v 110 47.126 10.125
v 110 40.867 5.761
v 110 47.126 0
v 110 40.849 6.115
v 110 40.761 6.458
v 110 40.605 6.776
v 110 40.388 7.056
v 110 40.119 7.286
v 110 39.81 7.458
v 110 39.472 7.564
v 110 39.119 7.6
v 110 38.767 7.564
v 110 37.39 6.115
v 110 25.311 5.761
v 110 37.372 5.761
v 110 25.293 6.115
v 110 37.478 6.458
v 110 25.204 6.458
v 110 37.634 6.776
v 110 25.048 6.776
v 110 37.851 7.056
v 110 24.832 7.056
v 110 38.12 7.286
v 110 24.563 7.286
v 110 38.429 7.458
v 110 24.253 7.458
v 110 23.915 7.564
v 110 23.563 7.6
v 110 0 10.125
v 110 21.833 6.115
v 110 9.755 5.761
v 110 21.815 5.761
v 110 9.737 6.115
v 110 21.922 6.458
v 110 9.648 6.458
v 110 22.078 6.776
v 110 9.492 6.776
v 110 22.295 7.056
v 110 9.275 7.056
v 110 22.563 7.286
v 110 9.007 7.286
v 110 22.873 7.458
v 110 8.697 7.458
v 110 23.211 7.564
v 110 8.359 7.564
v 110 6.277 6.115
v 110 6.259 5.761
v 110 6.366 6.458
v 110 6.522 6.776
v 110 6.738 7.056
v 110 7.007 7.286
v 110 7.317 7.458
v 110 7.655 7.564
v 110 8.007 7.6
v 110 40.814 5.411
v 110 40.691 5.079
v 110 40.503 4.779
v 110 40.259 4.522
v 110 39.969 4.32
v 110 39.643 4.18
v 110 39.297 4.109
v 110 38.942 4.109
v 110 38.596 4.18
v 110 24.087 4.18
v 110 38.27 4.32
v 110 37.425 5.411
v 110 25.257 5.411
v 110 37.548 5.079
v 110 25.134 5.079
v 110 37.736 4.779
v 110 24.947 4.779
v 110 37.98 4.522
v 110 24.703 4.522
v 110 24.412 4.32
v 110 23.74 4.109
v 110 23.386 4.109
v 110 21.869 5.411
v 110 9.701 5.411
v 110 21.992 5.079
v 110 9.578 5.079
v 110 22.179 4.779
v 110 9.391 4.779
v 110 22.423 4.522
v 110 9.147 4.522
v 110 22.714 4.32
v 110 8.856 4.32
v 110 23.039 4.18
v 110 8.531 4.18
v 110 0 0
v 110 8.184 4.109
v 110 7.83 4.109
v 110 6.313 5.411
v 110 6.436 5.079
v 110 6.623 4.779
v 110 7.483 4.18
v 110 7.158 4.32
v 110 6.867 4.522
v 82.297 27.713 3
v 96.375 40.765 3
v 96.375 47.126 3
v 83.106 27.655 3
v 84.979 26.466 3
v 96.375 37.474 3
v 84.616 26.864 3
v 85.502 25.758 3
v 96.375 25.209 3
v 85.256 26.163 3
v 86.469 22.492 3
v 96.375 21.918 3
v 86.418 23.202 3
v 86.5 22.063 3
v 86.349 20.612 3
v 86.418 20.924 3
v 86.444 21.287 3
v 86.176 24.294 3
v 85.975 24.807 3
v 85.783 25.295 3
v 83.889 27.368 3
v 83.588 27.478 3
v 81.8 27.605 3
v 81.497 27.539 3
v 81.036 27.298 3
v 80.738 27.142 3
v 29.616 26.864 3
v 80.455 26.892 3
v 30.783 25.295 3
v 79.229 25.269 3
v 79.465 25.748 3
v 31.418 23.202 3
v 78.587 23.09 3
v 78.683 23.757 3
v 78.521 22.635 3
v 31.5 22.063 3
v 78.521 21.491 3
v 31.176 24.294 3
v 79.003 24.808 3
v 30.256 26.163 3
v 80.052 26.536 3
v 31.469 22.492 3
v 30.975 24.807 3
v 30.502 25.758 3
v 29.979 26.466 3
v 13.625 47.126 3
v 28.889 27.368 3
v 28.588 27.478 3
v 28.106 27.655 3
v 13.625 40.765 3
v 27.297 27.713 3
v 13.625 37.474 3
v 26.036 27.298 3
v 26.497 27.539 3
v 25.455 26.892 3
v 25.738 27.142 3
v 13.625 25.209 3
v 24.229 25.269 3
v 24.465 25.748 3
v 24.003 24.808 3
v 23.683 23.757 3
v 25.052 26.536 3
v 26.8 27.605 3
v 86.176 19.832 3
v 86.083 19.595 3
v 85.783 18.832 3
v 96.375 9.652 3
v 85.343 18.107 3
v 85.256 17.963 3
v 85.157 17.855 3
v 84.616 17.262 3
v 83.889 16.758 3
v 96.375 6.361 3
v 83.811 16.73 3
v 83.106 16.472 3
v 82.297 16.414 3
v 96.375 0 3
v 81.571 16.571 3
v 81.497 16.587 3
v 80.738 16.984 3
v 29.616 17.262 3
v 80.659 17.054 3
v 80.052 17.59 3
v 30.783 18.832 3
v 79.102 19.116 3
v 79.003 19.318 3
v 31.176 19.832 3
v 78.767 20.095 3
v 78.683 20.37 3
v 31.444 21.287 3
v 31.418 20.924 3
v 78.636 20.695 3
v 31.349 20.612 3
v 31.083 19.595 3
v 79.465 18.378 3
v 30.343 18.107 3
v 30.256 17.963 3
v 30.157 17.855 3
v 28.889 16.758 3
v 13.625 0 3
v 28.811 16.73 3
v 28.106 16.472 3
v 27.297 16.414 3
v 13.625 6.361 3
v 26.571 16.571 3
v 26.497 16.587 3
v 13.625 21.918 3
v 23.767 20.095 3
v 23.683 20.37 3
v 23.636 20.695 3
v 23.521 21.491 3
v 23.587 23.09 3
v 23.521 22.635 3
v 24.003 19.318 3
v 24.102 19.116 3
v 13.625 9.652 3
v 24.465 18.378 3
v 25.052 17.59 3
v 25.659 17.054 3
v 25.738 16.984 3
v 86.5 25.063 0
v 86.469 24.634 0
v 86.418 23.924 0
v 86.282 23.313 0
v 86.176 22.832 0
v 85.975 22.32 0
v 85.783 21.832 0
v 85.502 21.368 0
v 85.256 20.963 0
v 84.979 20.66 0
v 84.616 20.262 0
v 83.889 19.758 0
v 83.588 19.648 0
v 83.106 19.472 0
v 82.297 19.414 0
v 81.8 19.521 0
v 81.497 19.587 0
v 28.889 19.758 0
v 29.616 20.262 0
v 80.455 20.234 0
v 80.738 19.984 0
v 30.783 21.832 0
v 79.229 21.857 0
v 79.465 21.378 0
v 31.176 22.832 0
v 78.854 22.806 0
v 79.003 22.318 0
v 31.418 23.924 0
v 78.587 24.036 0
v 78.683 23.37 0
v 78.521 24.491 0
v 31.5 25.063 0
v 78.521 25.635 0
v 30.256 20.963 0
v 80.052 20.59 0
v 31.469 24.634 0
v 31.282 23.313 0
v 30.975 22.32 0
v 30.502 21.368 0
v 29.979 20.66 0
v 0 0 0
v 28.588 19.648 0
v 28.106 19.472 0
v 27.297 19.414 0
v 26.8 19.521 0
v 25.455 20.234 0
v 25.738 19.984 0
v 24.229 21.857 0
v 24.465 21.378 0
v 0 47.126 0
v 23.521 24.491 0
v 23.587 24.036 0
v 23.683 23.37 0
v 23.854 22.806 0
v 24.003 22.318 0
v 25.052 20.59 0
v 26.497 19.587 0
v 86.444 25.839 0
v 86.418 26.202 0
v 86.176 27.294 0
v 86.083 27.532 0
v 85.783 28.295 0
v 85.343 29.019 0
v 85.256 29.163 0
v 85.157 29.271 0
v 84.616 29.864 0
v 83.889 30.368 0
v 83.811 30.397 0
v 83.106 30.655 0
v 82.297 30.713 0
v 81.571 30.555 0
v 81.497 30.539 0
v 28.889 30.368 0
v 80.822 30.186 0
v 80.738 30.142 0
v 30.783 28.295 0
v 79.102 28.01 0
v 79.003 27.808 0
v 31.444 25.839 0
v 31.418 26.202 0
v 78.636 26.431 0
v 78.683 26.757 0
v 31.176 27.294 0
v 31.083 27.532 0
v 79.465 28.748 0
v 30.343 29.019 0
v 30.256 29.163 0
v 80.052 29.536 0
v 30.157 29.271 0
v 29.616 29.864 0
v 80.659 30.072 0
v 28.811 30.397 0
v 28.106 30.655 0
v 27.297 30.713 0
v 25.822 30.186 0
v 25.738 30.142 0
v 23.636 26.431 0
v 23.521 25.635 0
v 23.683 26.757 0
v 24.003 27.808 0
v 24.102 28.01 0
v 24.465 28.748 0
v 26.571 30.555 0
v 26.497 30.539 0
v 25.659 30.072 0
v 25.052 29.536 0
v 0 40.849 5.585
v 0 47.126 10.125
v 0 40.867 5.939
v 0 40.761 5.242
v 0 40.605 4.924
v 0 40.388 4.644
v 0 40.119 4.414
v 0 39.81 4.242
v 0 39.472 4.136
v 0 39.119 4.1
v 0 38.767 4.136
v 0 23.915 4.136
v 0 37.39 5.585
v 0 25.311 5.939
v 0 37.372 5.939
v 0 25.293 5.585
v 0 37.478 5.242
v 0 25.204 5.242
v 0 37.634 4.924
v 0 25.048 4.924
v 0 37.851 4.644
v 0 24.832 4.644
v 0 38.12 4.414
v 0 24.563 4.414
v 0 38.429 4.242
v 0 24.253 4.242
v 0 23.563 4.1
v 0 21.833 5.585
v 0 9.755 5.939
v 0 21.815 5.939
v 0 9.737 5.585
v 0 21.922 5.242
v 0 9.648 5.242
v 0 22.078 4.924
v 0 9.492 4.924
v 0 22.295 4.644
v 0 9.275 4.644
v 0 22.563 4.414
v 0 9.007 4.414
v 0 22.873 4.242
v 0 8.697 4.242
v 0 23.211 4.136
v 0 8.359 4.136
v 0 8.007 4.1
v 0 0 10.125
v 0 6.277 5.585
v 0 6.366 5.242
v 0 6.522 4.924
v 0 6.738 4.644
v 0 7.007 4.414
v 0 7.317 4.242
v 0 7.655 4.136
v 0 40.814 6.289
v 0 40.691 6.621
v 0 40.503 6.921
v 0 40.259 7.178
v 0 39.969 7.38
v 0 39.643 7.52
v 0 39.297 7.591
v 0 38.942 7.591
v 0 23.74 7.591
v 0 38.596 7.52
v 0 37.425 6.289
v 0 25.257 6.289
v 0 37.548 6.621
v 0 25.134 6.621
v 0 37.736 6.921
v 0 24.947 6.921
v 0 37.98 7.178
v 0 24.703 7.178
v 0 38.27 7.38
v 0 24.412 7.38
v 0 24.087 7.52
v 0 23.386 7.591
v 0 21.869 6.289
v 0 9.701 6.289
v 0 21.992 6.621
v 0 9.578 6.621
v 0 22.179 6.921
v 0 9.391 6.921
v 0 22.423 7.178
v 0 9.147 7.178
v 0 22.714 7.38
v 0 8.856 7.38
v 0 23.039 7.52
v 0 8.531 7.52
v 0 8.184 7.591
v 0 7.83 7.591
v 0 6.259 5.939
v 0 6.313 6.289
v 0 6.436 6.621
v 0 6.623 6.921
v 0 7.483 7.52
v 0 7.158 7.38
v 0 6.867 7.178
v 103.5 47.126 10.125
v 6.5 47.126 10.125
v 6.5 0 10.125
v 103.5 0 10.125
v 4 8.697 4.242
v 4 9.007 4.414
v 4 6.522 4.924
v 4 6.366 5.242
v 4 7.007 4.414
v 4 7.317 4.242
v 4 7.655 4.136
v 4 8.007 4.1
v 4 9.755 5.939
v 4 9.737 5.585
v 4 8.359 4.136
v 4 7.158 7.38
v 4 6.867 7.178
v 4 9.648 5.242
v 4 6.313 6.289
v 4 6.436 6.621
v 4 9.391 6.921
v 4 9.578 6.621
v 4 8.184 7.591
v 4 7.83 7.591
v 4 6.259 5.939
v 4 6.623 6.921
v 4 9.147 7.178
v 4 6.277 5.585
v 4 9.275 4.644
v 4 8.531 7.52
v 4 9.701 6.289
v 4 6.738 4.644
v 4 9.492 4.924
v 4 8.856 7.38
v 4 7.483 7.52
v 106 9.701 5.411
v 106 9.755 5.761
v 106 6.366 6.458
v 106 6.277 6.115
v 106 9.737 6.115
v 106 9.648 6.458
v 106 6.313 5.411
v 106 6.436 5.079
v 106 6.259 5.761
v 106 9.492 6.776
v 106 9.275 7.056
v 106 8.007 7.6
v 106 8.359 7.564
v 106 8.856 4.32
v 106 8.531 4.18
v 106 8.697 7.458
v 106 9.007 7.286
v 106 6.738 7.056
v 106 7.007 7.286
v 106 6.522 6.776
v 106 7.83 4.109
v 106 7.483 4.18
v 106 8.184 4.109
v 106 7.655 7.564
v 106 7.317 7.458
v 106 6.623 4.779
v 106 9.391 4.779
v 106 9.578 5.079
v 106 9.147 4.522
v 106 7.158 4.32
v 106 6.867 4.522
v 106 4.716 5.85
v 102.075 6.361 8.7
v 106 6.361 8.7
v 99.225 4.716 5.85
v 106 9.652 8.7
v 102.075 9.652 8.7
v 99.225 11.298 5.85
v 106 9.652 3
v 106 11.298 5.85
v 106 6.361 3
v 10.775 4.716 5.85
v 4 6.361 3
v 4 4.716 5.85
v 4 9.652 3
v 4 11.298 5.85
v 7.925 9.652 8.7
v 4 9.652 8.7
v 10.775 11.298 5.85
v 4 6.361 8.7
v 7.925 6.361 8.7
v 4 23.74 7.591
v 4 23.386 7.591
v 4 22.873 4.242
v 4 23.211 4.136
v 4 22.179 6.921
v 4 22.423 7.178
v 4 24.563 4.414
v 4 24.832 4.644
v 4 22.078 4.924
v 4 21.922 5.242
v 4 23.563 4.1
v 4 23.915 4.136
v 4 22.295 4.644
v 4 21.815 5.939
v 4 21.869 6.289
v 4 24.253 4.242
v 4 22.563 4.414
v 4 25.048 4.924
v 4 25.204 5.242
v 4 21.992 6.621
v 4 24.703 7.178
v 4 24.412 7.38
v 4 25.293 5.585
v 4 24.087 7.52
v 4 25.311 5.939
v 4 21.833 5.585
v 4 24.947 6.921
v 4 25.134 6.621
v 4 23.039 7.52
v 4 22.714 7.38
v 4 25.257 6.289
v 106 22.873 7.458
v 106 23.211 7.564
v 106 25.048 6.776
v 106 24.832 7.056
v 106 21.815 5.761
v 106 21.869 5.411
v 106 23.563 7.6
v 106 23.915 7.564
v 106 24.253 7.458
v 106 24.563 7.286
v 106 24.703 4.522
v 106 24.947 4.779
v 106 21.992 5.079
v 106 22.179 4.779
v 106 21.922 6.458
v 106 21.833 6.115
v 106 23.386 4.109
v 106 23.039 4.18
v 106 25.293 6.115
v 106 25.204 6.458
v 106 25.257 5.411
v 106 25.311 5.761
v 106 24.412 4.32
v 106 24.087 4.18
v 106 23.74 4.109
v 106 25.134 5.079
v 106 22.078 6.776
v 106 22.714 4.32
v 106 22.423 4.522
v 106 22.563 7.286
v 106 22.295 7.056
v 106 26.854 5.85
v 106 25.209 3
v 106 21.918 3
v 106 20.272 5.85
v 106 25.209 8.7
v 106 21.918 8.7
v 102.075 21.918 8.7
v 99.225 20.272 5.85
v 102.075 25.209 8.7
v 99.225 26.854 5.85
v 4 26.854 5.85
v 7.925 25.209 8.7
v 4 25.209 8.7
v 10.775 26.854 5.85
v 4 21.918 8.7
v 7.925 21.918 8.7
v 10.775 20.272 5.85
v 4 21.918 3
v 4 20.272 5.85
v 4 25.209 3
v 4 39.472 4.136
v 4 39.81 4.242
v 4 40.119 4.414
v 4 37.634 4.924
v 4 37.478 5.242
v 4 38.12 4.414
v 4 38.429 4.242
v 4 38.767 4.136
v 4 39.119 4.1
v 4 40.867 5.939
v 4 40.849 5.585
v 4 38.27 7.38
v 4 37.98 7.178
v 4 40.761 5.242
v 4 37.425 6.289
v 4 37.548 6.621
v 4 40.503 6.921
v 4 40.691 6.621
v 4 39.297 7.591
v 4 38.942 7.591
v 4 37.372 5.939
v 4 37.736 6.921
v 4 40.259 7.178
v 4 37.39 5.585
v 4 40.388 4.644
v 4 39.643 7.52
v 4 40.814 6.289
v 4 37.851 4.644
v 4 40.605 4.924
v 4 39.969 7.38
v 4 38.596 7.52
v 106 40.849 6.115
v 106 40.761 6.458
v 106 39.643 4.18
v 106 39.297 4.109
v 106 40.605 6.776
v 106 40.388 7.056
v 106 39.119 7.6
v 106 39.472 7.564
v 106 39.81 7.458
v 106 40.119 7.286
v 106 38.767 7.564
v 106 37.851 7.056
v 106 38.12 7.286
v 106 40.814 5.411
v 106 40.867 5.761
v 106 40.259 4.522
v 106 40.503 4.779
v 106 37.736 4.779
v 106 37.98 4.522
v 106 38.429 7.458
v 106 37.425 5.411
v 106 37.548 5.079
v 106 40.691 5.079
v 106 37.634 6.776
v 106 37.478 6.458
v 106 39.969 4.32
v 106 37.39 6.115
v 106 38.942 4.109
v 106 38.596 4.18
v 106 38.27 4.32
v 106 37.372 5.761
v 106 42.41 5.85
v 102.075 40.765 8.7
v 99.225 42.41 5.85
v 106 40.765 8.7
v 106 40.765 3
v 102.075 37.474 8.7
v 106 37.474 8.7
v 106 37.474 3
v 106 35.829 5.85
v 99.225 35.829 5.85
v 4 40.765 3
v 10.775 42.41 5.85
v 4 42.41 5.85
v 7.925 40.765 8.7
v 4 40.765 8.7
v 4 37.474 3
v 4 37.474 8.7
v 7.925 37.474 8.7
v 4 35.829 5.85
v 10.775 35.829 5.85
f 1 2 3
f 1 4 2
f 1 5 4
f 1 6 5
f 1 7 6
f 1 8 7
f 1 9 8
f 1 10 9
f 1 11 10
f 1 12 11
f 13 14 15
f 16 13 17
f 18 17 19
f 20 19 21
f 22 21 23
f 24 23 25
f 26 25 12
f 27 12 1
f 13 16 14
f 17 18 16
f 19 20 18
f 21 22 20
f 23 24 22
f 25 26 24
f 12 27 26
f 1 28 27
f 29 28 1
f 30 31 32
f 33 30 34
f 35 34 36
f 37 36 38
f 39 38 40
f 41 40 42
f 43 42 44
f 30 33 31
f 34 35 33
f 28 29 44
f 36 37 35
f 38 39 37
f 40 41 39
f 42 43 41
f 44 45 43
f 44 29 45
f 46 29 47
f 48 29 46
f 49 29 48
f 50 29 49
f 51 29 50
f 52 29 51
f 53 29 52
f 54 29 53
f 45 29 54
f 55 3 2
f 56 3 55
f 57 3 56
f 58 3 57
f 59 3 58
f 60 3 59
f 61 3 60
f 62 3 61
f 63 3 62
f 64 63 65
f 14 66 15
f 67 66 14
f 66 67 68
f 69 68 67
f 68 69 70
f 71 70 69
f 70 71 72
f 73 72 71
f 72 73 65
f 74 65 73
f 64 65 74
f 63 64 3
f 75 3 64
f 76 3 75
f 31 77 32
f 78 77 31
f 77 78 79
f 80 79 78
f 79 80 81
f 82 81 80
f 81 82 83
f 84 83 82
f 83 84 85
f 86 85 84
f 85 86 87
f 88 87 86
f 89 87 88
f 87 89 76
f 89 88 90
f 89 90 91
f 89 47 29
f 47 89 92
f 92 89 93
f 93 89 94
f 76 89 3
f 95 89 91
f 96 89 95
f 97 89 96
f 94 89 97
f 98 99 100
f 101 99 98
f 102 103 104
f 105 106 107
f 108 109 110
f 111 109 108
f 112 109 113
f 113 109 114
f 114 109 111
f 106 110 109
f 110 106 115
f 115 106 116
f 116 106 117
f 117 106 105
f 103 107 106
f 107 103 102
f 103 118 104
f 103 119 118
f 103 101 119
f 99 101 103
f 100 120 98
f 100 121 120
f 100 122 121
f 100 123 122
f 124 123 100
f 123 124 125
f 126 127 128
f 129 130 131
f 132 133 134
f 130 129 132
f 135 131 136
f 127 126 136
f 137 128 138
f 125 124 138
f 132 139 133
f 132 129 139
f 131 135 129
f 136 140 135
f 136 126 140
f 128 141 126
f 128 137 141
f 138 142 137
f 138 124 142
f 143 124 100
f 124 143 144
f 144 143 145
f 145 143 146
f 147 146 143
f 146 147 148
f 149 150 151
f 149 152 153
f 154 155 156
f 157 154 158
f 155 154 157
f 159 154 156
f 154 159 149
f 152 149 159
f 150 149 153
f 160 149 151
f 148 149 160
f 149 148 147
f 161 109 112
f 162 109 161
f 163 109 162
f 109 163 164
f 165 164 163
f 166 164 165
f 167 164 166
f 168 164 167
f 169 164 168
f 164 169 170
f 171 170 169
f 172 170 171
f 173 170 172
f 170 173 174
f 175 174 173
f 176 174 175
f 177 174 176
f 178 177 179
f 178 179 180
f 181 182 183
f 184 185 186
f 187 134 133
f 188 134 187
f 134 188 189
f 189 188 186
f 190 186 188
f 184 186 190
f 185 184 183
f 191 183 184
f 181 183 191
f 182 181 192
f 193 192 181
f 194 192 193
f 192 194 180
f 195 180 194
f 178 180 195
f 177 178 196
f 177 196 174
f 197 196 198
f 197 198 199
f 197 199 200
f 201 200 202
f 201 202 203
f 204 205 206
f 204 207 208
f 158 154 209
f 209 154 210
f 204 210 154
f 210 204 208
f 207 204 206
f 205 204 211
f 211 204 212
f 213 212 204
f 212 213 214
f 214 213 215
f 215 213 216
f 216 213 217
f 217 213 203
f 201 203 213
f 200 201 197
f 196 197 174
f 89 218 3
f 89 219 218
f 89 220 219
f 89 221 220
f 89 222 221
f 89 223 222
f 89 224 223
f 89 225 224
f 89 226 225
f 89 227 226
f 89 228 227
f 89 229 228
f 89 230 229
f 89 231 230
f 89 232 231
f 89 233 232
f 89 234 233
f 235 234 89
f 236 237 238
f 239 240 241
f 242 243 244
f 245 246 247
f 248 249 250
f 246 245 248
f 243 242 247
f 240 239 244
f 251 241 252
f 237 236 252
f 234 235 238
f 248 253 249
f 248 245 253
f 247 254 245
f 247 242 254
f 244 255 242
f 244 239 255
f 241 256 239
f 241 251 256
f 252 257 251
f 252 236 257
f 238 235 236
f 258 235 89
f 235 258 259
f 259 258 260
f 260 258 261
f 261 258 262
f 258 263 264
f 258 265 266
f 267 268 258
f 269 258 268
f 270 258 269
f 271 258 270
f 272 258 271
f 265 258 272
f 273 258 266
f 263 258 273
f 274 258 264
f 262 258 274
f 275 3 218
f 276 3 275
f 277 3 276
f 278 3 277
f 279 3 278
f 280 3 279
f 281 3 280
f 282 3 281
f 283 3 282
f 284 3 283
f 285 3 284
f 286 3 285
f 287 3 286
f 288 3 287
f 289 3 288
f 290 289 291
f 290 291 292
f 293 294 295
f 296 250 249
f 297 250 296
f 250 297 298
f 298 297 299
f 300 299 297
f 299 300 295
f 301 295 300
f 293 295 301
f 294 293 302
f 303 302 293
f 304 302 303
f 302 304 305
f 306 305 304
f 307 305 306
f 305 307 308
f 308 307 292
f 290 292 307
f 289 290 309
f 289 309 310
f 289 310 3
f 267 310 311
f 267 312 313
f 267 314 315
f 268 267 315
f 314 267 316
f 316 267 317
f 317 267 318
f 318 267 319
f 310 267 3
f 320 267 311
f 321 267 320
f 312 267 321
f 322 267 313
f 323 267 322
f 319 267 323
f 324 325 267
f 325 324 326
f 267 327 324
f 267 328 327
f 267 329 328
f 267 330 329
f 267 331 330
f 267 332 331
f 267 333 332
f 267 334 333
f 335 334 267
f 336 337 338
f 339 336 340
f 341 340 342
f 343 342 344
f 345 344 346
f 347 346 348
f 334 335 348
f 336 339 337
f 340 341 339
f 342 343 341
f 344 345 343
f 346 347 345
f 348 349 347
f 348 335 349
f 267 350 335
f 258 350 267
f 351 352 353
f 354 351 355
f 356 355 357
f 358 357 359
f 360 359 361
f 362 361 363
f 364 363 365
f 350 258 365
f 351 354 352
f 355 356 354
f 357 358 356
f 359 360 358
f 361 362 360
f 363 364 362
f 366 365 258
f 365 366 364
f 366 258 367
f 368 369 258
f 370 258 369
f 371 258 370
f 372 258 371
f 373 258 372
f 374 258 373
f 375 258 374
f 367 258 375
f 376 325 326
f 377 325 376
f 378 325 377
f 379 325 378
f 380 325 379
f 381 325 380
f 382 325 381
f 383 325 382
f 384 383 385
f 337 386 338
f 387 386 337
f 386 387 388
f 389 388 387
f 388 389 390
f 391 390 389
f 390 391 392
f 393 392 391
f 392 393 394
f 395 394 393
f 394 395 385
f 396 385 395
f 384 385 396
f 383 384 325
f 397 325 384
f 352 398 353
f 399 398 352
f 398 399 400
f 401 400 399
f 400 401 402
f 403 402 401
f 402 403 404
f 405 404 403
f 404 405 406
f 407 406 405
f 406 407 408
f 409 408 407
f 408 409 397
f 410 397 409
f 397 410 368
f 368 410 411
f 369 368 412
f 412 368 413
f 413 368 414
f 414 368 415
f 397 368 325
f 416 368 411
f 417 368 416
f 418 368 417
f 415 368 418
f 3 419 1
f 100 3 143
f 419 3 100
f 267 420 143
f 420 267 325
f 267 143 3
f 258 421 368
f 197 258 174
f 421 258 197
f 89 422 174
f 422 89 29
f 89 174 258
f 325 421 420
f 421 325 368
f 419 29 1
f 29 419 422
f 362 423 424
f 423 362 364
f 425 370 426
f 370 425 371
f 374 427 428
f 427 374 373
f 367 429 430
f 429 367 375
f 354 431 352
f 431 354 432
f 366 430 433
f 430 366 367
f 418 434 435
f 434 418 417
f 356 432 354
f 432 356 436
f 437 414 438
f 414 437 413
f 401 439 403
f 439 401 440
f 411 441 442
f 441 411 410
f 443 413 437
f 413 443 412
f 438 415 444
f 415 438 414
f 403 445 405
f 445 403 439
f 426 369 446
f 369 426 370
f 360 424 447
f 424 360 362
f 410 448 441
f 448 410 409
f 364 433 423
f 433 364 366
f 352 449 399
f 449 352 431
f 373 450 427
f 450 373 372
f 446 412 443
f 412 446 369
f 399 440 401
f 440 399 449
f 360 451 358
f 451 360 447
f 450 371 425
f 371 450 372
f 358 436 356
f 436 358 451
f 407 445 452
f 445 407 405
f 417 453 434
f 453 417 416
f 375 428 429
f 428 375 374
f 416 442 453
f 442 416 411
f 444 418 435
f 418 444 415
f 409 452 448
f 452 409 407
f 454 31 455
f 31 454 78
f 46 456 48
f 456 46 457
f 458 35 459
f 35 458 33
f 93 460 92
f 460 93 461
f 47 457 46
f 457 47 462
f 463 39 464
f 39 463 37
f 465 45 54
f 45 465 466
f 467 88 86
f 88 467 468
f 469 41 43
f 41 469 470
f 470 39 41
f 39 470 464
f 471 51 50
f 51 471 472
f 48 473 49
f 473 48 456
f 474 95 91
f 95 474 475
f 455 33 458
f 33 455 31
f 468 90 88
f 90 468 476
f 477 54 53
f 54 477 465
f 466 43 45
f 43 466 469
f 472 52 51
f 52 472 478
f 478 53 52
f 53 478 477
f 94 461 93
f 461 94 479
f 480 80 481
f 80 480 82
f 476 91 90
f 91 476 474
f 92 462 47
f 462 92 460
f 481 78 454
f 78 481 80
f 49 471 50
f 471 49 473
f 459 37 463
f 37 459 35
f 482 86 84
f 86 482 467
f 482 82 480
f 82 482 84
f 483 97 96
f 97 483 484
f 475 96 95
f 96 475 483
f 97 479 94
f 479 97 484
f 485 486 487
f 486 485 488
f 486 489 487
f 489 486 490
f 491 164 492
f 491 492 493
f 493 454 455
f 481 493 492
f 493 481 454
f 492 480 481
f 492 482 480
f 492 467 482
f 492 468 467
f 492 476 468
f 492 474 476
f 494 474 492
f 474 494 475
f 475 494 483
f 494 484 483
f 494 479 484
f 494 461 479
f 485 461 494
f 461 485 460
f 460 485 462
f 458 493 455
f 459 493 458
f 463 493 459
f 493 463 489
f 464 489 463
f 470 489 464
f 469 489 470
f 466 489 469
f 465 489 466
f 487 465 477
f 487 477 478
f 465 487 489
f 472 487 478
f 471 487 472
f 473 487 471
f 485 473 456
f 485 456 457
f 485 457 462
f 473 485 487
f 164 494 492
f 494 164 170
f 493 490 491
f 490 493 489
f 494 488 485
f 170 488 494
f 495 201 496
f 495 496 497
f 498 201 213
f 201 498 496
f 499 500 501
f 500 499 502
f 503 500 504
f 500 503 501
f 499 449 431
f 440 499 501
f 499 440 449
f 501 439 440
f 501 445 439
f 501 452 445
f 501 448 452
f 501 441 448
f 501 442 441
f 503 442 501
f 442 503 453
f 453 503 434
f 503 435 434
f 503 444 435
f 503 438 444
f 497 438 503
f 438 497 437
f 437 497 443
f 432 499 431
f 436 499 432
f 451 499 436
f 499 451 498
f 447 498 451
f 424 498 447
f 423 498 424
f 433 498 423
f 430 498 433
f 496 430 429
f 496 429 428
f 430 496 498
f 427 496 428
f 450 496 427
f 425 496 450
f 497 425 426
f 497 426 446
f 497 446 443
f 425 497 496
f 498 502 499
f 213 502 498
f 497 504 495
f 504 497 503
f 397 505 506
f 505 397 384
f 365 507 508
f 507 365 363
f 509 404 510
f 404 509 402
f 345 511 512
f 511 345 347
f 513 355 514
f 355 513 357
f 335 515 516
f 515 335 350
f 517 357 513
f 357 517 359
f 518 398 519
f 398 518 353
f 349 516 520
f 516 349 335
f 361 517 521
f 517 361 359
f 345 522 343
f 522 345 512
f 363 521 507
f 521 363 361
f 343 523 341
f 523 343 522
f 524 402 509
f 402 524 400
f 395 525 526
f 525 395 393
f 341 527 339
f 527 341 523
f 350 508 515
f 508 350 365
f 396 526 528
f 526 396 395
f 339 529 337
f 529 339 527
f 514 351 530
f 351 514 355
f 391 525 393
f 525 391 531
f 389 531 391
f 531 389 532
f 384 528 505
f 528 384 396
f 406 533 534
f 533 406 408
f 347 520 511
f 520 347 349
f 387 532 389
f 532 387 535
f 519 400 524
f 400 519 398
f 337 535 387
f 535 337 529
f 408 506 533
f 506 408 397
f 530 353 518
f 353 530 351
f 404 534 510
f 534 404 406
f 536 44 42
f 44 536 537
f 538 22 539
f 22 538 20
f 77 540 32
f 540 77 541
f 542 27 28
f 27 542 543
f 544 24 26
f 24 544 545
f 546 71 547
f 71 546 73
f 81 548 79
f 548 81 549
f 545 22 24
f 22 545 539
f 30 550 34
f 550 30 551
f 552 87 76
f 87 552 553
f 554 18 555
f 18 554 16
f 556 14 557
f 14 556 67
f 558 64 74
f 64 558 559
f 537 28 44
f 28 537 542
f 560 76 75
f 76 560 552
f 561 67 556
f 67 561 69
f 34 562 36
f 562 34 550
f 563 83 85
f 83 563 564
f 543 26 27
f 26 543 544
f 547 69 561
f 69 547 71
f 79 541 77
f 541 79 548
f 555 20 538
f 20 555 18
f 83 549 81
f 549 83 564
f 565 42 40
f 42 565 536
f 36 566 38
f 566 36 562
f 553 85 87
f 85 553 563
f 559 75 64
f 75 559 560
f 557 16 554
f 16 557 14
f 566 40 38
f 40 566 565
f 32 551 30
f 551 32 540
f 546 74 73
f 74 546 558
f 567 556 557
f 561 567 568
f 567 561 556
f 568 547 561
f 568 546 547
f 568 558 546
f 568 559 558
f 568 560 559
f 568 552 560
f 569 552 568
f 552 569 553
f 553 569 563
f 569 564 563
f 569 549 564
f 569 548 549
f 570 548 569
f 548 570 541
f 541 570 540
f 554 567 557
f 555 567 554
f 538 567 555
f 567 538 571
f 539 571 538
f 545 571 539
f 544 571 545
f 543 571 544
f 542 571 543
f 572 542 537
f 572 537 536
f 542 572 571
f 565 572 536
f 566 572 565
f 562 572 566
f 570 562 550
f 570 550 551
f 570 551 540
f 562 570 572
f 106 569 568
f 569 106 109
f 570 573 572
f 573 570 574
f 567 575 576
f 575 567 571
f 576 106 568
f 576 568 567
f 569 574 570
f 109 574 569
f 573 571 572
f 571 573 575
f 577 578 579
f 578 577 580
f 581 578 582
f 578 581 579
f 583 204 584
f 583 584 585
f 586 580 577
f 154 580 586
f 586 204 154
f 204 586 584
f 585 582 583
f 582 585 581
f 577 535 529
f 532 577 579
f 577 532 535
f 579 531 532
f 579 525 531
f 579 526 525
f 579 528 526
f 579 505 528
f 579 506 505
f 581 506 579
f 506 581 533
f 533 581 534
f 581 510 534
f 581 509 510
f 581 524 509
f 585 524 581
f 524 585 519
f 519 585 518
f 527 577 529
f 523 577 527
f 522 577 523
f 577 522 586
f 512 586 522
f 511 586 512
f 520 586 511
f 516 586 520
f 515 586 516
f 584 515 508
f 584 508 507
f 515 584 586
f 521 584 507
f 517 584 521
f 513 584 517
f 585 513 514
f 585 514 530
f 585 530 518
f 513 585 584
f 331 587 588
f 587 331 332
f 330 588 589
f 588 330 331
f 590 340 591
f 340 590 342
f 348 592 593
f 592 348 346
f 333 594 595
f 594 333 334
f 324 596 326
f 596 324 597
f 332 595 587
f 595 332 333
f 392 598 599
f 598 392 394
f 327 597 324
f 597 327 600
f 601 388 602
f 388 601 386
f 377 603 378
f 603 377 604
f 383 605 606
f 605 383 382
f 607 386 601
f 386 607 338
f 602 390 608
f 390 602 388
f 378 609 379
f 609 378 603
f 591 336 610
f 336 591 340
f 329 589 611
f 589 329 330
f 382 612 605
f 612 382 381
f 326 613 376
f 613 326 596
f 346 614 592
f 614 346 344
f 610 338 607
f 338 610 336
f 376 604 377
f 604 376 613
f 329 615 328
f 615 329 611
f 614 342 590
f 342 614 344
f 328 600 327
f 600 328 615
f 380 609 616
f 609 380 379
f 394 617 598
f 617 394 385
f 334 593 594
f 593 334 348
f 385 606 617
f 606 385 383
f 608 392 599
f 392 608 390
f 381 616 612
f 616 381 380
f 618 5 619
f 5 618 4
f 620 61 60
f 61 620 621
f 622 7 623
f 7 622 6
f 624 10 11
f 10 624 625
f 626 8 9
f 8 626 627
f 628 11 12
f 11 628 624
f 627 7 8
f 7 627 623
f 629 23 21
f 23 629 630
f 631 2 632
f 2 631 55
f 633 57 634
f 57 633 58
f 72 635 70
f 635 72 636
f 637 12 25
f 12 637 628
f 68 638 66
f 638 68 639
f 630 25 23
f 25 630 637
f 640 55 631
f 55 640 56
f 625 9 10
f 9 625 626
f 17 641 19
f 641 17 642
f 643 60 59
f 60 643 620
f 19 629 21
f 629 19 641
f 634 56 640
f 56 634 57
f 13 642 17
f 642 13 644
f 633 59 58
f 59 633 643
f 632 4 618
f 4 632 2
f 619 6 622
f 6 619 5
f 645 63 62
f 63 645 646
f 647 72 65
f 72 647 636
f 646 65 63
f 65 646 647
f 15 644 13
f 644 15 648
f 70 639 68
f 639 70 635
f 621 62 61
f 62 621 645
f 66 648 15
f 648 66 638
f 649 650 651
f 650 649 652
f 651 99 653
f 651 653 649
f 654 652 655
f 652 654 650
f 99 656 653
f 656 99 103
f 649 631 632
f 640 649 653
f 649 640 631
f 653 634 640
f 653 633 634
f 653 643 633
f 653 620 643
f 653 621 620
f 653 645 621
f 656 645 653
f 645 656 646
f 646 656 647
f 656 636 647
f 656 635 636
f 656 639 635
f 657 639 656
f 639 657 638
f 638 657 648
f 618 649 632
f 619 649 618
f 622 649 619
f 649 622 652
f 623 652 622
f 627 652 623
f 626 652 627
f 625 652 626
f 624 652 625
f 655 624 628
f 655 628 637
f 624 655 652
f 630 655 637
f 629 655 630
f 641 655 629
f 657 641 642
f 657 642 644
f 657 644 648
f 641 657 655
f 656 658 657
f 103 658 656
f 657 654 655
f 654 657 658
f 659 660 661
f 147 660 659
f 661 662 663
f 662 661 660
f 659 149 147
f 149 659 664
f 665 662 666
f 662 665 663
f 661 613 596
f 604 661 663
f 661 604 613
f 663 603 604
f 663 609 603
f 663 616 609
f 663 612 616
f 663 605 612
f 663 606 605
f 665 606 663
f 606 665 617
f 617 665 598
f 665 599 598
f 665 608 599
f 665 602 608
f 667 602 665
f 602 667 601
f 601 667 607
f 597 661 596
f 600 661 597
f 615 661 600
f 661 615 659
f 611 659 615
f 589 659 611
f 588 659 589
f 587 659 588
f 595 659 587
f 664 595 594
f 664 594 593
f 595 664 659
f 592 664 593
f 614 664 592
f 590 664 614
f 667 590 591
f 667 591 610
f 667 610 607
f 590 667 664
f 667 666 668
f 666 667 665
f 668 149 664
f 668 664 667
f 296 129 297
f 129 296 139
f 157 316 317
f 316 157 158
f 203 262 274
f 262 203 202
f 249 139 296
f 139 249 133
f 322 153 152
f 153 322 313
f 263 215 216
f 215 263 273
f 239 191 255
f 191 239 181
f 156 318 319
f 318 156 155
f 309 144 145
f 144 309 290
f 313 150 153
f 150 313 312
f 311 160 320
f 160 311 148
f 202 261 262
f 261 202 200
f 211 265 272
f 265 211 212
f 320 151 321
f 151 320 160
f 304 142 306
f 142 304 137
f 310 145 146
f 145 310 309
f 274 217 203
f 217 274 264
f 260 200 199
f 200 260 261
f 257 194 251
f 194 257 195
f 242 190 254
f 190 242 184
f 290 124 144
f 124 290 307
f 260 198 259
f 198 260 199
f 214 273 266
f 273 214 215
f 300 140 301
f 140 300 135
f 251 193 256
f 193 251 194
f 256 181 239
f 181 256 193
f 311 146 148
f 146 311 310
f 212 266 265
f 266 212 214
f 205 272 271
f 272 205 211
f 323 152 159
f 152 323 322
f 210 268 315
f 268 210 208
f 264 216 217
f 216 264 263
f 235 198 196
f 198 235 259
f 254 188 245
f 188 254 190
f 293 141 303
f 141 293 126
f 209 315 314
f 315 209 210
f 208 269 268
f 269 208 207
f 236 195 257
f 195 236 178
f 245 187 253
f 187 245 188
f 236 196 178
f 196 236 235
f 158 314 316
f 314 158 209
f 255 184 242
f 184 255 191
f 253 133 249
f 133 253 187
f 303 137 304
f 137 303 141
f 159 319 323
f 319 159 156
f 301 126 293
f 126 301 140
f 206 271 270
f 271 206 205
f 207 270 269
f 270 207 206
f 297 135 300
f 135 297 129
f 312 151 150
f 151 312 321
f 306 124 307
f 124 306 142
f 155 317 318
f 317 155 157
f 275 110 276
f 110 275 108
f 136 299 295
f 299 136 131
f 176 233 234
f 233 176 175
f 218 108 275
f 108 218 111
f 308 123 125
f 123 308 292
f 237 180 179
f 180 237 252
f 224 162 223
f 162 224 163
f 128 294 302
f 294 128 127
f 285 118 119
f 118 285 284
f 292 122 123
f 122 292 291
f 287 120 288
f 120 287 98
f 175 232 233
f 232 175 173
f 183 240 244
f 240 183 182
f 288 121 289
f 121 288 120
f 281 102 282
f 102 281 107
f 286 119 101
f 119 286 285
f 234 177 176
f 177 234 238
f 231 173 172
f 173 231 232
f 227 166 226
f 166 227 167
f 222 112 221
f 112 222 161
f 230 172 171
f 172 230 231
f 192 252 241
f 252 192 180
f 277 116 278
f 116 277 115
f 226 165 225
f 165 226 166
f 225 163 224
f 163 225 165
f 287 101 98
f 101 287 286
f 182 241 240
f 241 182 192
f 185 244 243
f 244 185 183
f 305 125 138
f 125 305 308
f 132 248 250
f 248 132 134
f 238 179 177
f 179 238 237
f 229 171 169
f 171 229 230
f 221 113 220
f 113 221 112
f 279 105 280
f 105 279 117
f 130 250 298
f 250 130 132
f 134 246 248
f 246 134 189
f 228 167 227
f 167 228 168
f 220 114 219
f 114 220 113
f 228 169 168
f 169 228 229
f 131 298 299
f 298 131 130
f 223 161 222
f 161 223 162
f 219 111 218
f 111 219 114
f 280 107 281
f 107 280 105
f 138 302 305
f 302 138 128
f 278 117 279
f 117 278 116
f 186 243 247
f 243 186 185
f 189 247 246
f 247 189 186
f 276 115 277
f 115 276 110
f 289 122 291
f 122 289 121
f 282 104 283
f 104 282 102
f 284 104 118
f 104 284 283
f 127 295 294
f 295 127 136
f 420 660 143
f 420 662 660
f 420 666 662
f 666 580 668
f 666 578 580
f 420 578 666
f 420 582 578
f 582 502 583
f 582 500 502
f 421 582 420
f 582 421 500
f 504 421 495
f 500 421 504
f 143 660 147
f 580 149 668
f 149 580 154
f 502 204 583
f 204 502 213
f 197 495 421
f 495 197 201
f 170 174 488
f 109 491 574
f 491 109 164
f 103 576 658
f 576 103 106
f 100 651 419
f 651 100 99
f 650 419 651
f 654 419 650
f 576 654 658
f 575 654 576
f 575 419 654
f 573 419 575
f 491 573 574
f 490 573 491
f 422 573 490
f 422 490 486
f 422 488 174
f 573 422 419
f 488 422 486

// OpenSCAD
// file: config.scad
// https://docs.google.com/viewer?a=v&pid=explorer&chrome=true&srcid=0B8AGtzEPL1XpNGIwMjM0NzQtZmMyMS00YmU2LTkwMjItNTkzNzA0MDJkZTAx&hl=en_US&authkey=CMjZjW0

$fn = 31;

//Delta config constants
upperlinkage = 63; 
lowerlinkage = 126;
baseradius = 45;
endeffector = 50; //radius of the end effector
fourbarspacing = 70;

//hardware
screwdia = 3.5; //m3
screwheaddia = 5.6; //m3
screwheadheight = 3.2; //m3
nutapothem = 5.7; //m3
nutheight = 2.5; //m3 lock nut

//motors 
holespacing = 17*2.54*sin(45); //nema 17
shaftlength = 22;
shaftdia = 5;
bodylength = 48;
bodywidth = 42; //could also be diameter of a round servo
motorwall = 2.75;
motorcenterdia = 22;

//Structure pieces
structbase = 110;  //180
structheight = 40;  //70
structholes = 3; //how many holes are on each side. 
structthickness = 2;
structbracewidth = 9;

//z axis plates
smoothroddia = 8;
platelength = 110;
platethickness = 3;

//cups
cupwall = 2.7;


//base
basemotorwall = 4;

//upper linkage
upperlinkthick = nutapothem/cos(30);
upperlinkwidth = 20;

//general shit
nutwall = nutapothem/4;
// main file
/*
  Deltafab - A Fully Parametric and Printable RepRap
    Copyright (C) 2011  Steve Kelly

    This program is free software: you can redistribute it and/or modify
    it under the terms of the GNU General Public License as published by
    the Free Software Foundation, either version 3 of the License, or
    (at your option) any later version.

    This program is distributed in the hope that it will be useful,
    but WITHOUT ANY WARRANTY; without even the implied warranty of
    MERCHANTABILITY or FITNESS FOR A PARTICULAR PURPOSE.  See the
    GNU General Public License for more details.

    You should have received a copy of the GNU General Public License
    along with this program.  If not, see <http://www.gnu.org/licenses/>.
*/

include <config.scad>;

module motorplate(){


	//Breakout and distributed vars
	plateheight = ((structheight-structbracewidth*2)/sin(45))+nutwall*2+nutapothem/cos(30)*2;
	plateside = structthickness*2;

difference(){

	union(){
		cube([platelength,plateheight,platethickness]);
		cube([plateside+nutheight+nutapothem+nutwall,plateheight,platethickness+nutapothem+nutwall]);
		translate([platelength-(plateside+nutheight+nutapothem+nutwall),0,0])cube([plateside+nutheight+nutapothem+nutwall,plateheight,platethickness+nutapothem+nutwall]);
	
	}

	//Create holes and nut traps
	for(i=[0 : ((structheight-structbracewidth*2)/sin(45))/(structholes-1) : ((structheight-structbracewidth*2)/sin(45))]){
		translate([0,0,platethickness+(nutapothem/2)])rotate([0,90,0])translate([0,nutwall+nutapothem/cos(30)+i,-1])cylinder(r=screwdia/2,h=plateside*2+nutheight+2);
		translate([platelength,0,platethickness+(nutapothem/2)])rotate([0,-90,0])translate([0,nutwall+nutapothem/cos(30)+i,-1])cylinder(r=screwdia/2,h=plateside+nutheight*2+2);
		translate([platelength,0,platethickness+(nutapothem/2)])rotate([0,-90,0])translate([0,nutwall+nutapothem/cos(30)+i,plateside])rotate([0,0,30])cylinder(r=nutapothem/cos(30)/2,h=nutheight+nutapothem+nutwall, $fn=6);
		translate([0,0,platethickness+(nutapothem/2)])rotate([0,90,0])translate([0,nutwall+nutapothem/cos(30)+i,plateside])rotate([0,0,30])cylinder(r=nutapothem/cos(30)/2,h=nutheight+nutapothem+nutwall, $fn=6);
	}

	translate([platelength/4,plateheight/2,platethickness/2])rotate([45,0,0])cylinder(r=smoothroddia/2, h=(platethickness*3)/sin(45)+2,center=true);
	translate([platelength*0.75,plateheight/2,platethickness/2])rotate([45,0,0])cylinder(r=smoothroddia/2, h=(platethickness*3)/sin(45)+2,center=true);
	translate([plateside+nutheight+nutapothem+nutwall,-1,platethickness])rotate([0,-45,0])cube([nutapothem+nutwall,plateheight+2,(nutapothem+nutwall)/sin(45)]);
	translate([platelength-(plateside+nutheight+nutapothem+nutwall),-1,platethickness])rotate([0,45,0])translate([-nutapothem-nutwall,0,0])cube([nutapothem+nutwall,plateheight+2,(nutapothem+nutwall)/sin(45)]);

}

}
motorplate();
